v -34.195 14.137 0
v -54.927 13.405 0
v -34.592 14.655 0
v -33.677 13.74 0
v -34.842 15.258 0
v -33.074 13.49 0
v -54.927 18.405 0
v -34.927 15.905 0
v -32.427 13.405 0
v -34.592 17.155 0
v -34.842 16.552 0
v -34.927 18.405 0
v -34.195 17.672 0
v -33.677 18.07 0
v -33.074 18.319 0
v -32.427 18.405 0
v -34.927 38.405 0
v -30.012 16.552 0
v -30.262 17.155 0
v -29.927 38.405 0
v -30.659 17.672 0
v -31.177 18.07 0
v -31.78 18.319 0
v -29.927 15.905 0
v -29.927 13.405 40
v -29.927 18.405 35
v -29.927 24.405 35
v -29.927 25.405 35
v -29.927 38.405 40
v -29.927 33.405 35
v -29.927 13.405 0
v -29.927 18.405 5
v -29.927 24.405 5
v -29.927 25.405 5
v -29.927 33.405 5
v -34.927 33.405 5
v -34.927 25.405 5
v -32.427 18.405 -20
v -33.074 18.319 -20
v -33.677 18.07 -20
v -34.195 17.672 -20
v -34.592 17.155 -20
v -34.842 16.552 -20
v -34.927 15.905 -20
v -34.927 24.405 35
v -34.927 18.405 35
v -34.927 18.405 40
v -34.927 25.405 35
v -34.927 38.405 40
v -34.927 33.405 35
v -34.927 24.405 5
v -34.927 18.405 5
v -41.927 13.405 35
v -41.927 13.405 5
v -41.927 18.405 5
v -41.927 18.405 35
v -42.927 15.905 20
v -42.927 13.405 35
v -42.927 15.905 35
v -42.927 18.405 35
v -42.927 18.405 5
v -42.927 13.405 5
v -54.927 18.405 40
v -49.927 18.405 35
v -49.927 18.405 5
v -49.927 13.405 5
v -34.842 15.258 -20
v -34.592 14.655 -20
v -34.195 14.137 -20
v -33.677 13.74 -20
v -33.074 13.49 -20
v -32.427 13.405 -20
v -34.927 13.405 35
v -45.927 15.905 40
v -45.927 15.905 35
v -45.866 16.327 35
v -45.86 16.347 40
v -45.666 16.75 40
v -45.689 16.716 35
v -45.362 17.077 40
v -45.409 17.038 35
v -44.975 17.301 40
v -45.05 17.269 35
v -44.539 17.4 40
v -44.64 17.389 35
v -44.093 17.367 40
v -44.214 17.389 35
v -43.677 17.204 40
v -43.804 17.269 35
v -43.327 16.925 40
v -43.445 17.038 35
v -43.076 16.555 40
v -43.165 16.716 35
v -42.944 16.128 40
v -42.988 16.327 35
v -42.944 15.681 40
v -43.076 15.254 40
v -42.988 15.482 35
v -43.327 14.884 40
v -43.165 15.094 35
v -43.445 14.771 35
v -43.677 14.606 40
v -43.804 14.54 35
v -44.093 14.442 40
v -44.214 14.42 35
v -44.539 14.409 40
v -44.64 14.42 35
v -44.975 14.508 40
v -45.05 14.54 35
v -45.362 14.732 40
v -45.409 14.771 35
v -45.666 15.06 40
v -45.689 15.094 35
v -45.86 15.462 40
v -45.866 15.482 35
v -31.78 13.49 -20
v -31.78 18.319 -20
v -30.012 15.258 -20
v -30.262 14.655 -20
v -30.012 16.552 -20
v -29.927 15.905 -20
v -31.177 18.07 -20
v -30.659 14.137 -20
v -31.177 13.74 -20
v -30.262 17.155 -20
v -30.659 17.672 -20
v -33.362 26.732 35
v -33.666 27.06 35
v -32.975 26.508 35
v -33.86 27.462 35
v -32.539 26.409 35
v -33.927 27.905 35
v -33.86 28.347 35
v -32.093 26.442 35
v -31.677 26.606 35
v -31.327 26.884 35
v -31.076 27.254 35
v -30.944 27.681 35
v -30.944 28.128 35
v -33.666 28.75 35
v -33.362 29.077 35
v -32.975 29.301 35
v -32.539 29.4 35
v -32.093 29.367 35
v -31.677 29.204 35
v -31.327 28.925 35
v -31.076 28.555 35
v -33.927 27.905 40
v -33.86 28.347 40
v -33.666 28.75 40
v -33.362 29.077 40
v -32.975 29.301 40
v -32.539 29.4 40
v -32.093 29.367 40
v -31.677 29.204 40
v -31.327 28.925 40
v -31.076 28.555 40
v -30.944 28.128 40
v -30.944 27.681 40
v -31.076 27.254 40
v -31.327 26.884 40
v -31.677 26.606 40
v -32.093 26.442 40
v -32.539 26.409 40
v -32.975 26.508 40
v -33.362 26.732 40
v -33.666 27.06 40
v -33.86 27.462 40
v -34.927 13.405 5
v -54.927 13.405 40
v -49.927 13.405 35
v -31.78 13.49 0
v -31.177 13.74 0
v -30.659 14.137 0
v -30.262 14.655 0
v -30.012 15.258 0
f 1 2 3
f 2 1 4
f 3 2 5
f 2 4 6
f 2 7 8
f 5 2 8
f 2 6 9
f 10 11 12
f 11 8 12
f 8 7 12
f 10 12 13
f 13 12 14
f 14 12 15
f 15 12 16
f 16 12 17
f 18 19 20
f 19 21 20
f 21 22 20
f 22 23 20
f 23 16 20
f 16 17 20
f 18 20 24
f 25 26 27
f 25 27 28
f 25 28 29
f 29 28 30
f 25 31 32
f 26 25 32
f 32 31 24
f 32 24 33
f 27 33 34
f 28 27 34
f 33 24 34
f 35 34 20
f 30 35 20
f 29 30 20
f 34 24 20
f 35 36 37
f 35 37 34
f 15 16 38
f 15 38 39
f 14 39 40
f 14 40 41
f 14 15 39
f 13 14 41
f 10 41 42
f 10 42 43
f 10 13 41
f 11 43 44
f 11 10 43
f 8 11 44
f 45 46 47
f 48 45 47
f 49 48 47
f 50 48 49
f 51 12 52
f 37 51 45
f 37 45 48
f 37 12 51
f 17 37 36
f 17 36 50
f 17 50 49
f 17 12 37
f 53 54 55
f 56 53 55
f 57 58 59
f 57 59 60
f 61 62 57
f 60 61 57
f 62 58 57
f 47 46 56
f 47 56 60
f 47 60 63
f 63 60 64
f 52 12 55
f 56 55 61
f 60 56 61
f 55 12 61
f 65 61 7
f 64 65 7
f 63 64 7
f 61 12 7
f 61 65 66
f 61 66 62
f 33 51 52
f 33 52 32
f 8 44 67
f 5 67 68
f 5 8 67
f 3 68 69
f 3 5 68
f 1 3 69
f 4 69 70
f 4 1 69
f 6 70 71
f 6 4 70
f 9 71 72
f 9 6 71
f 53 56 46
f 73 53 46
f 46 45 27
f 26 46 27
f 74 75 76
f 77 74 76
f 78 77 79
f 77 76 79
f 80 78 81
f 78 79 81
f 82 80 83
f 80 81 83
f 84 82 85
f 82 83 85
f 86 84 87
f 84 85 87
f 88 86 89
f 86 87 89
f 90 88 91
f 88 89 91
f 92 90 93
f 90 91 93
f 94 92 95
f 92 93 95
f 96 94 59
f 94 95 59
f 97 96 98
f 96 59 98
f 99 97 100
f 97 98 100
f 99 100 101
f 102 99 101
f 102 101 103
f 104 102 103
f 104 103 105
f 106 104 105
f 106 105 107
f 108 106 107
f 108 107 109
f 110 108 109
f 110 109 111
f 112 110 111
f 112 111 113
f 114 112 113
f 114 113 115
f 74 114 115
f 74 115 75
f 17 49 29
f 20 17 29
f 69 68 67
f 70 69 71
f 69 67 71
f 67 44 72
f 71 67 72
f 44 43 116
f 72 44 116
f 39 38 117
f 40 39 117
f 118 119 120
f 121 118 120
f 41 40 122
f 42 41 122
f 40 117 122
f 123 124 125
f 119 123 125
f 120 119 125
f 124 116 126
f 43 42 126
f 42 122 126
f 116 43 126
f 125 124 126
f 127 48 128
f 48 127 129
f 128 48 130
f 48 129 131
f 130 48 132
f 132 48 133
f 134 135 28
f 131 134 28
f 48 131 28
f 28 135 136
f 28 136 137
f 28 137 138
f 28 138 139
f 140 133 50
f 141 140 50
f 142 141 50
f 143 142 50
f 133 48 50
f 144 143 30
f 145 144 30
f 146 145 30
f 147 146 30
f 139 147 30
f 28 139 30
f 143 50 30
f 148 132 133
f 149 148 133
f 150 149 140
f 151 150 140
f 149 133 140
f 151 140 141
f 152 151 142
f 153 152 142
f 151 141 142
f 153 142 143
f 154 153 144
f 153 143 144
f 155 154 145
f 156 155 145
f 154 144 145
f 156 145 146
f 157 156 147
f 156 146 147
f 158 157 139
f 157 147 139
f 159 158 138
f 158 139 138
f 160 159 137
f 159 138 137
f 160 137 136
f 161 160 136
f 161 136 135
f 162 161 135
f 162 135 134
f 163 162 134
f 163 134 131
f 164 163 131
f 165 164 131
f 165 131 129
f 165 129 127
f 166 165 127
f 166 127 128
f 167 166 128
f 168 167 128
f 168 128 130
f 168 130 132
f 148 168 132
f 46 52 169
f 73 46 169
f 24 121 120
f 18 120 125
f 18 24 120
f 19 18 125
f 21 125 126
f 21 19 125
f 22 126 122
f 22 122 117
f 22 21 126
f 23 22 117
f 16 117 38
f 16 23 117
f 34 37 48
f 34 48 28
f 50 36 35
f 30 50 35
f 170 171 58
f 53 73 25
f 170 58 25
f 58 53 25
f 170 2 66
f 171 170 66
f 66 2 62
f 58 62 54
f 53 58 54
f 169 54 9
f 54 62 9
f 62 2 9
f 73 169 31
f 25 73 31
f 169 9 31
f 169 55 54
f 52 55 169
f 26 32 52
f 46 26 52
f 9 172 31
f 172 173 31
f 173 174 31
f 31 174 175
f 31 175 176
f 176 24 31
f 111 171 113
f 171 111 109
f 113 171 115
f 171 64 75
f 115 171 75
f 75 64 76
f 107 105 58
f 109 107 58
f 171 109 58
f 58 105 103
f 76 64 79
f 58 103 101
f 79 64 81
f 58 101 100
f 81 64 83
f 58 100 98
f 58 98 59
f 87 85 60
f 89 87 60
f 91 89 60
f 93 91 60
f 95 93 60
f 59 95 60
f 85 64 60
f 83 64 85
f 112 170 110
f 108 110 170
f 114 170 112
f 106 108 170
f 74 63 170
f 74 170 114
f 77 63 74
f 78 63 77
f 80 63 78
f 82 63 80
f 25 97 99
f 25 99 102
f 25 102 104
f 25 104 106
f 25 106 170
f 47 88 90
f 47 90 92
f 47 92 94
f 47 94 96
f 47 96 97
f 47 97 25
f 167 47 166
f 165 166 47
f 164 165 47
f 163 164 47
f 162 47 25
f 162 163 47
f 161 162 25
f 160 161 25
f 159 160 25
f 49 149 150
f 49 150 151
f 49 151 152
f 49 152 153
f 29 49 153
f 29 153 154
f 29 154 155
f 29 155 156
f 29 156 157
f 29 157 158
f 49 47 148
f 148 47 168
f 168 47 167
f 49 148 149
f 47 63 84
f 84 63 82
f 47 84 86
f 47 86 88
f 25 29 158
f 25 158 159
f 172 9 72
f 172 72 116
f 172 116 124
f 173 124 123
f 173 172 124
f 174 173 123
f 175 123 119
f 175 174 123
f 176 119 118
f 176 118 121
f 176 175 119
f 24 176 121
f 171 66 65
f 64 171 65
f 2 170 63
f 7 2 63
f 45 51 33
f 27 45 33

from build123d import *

# Parameters (mm, degrees)
F0_W     = 5
F0_H     = 8
F0_W_2   = 7
F0_H_2   = 5
F0_W_3   = 1
F0_H_3   = 1
F1_DEPTH = 5
F2_DEPTH = 40
F3_START = 35
F3_DEPTH = 5
F4_DEPTH = 20
F6_D     = 3
F6_DEPTH = 20
F6_TIP   = 0.9012909285


with BuildPart() as f1:
    # F0 (on Top) → F1 (new body)
    with BuildSketch(Plane.XY):
        with Locations((-32.4270167043, 29.4046077263)):
            Rectangle(F0_W, F0_H)
        with Locations((-46.4270167043, 15.9046077263)):
            Rectangle(F0_W_2, F0_H_2)
        with Locations((-52.4270167043, 15.9046077263)):
            Rectangle(F0_W, F0_H_2)
        with Locations((-32.4270167043, 35.9046077263)):
            Rectangle(F0_W, F0_H_2)
        with BuildLine():
            ThreePointArc((-34.9270167043, 15.9046077263), (-34.1947836573, 14.1368407733), (-32.4270167043, 13.4046077263))
            ThreePointArc((-32.4270167043, 13.4046077263), (-30.6592497514, 14.1368407733), (-29.9270167043, 15.9046077263))
            ThreePointArc((-29.9270167043, 15.9046077263), (-30.6592497514, 17.6723746792), (-32.4270167043, 18.4046077263))
            ThreePointArc((-32.4270167043, 18.4046077263), (-34.1947836573, 17.6723746792), (-34.9270167043, 15.9046077263))
        make_face()
        with BuildLine():
            ThreePointArc((-32.4270167043, 18.4046077263), (-30.6592497514, 17.6723746792), (-29.9270167043, 15.9046077263))
            Line((-29.9270167043, 15.9046077263), (-29.9270167043, 18.4046077263))
            Line((-29.9270167043, 18.4046077263), (-32.4270167043, 18.4046077263))
        make_face()
        with BuildLine():
            Line((-34.9270167043, 15.9046077263), (-34.9270167043, 13.4046077263))
            Line((-34.9270167043, 13.4046077263), (-32.4270167043, 13.4046077263))
            ThreePointArc((-32.4270167043, 13.4046077263), (-34.1947836573, 14.1368407733), (-34.9270167043, 15.9046077263))
        make_face()
        with BuildLine():
            ThreePointArc((-29.9270167043, 15.9046077263), (-30.6592497514, 14.1368407733), (-32.4270167043, 13.4046077263))
            Line((-32.4270167043, 13.4046077263), (-29.9270167043, 13.4046077263))
            Line((-29.9270167043, 13.4046077263), (-29.9270167043, 15.9046077263))
        make_face()
        with BuildLine():
            Line((-34.9270167043, 18.4046077263), (-34.9270167043, 15.9046077263))
            ThreePointArc((-34.9270167043, 15.9046077263), (-34.1947836573, 17.6723746792), (-32.4270167043, 18.4046077263))
            Line((-32.4270167043, 18.4046077263), (-34.9270167043, 18.4046077263))
        make_face()
        Polygon((-41.9270167043, 18.4046077263), (-41.9270167043, 13.4046077263), (-34.9270167043, 13.4046077263), (-34.9270167043, 15.9046077263), (-34.9270167043, 18.4046077263), align=None)
        with Locations((-42.4270167043, 15.9046077263)):
            Rectangle(F0_W_3, F0_H_2)
        Polygon((-34.9270167043, 24.4046077263), (-34.9270167043, 18.4046077263), (-32.4270167043, 18.4046077263), (-29.9270167043, 18.4046077263), (-29.9270167043, 24.4046077263), align=None)
        with Locations((-32.4270167043, 24.9046077263)):
            Rectangle(F0_W, F0_H_3)
    extrude(amount=F1_DEPTH)

    # F0 (on Top) → F2 (join)
    with BuildSketch(Plane.XY):
        with Locations((-52.4270167043, 15.9046077263)):
            Rectangle(F0_W, F0_H_2)
        with BuildLine():
            Line((-34.9270167043, 18.4046077263), (-34.9270167043, 15.9046077263))
            ThreePointArc((-34.9270167043, 15.9046077263), (-34.1947836573, 17.6723746792), (-32.4270167043, 18.4046077263))
            Line((-32.4270167043, 18.4046077263), (-34.9270167043, 18.4046077263))
        make_face()
        with BuildLine():
            Line((-34.9270167043, 15.9046077263), (-34.9270167043, 13.4046077263))
            Line((-34.9270167043, 13.4046077263), (-32.4270167043, 13.4046077263))
            ThreePointArc((-32.4270167043, 13.4046077263), (-34.1947836573, 14.1368407733), (-34.9270167043, 15.9046077263))
        make_face()
        with BuildLine():
            ThreePointArc((-34.9270167043, 15.9046077263), (-34.1947836573, 14.1368407733), (-32.4270167043, 13.4046077263))
            ThreePointArc((-32.4270167043, 13.4046077263), (-30.6592497514, 14.1368407733), (-29.9270167043, 15.9046077263))
            ThreePointArc((-29.9270167043, 15.9046077263), (-30.6592497514, 17.6723746792), (-32.4270167043, 18.4046077263))
            ThreePointArc((-32.4270167043, 18.4046077263), (-34.1947836573, 17.6723746792), (-34.9270167043, 15.9046077263))
        make_face()
        with BuildLine():
            ThreePointArc((-32.4270167043, 18.4046077263), (-30.6592497514, 17.6723746792), (-29.9270167043, 15.9046077263))
            Line((-29.9270167043, 15.9046077263), (-29.9270167043, 18.4046077263))
            Line((-29.9270167043, 18.4046077263), (-32.4270167043, 18.4046077263))
        make_face()
        with BuildLine():
            ThreePointArc((-29.9270167043, 15.9046077263), (-30.6592497514, 14.1368407733), (-32.4270167043, 13.4046077263))
            Line((-32.4270167043, 13.4046077263), (-29.9270167043, 13.4046077263))
            Line((-29.9270167043, 13.4046077263), (-29.9270167043, 15.9046077263))
        make_face()
        with Locations((-32.4270167043, 35.9046077263)):
            Rectangle(F0_W, F0_H_2)
        with Locations((-42.4270167043, 15.9046077263)):
            Rectangle(F0_W_3, F0_H_2)
        with Locations((-32.4270167043, 24.9046077263)):
            Rectangle(F0_W, F0_H_3)
    extrude(amount=F2_DEPTH)

    # F0 (on Top) → F3 (join)
    with BuildSketch(Plane.XY.offset(F3_START)):
        with Locations((-32.4270167043, 29.4046077263)):
            Rectangle(F0_W, F0_H)
        with Locations((-46.4270167043, 15.9046077263)):
            Rectangle(F0_W_2, F0_H_2)
        Polygon((-41.9270167043, 18.4046077263), (-41.9270167043, 13.4046077263), (-34.9270167043, 13.4046077263), (-34.9270167043, 15.9046077263), (-34.9270167043, 18.4046077263), align=None)
        Polygon((-34.9270167043, 24.4046077263), (-34.9270167043, 18.4046077263), (-32.4270167043, 18.4046077263), (-29.9270167043, 18.4046077263), (-29.9270167043, 24.4046077263), align=None)
    extrude(amount=F3_DEPTH)

    # F0 (on Top) → F4 (join)
    with BuildSketch(Plane.XY):
        with BuildLine():
            ThreePointArc((-34.9270167043, 15.9046077263), (-34.1947836573, 14.1368407733), (-32.4270167043, 13.4046077263))
            ThreePointArc((-32.4270167043, 13.4046077263), (-30.6592497514, 14.1368407733), (-29.9270167043, 15.9046077263))
            ThreePointArc((-29.9270167043, 15.9046077263), (-30.6592497514, 17.6723746792), (-32.4270167043, 18.4046077263))
            ThreePointArc((-32.4270167043, 18.4046077263), (-34.1947836573, 17.6723746792), (-34.9270167043, 15.9046077263))
        make_face()
    extrude(amount=-F4_DEPTH)

    # F6
    with Locations(Plane.XY.offset(40)):
        with Locations((-44.4270167043, 15.9046077263), (-32.4270167043, 27.9046077263)):
            Hole(F6_D / 2, depth=F6_DEPTH)
            with Locations((0, 0, -(F6_DEPTH + F6_TIP / 2))):  # 118° drill point
                Cone(0, F6_D / 2, F6_TIP, mode=Mode.SUBTRACT)


solid = f1.part
